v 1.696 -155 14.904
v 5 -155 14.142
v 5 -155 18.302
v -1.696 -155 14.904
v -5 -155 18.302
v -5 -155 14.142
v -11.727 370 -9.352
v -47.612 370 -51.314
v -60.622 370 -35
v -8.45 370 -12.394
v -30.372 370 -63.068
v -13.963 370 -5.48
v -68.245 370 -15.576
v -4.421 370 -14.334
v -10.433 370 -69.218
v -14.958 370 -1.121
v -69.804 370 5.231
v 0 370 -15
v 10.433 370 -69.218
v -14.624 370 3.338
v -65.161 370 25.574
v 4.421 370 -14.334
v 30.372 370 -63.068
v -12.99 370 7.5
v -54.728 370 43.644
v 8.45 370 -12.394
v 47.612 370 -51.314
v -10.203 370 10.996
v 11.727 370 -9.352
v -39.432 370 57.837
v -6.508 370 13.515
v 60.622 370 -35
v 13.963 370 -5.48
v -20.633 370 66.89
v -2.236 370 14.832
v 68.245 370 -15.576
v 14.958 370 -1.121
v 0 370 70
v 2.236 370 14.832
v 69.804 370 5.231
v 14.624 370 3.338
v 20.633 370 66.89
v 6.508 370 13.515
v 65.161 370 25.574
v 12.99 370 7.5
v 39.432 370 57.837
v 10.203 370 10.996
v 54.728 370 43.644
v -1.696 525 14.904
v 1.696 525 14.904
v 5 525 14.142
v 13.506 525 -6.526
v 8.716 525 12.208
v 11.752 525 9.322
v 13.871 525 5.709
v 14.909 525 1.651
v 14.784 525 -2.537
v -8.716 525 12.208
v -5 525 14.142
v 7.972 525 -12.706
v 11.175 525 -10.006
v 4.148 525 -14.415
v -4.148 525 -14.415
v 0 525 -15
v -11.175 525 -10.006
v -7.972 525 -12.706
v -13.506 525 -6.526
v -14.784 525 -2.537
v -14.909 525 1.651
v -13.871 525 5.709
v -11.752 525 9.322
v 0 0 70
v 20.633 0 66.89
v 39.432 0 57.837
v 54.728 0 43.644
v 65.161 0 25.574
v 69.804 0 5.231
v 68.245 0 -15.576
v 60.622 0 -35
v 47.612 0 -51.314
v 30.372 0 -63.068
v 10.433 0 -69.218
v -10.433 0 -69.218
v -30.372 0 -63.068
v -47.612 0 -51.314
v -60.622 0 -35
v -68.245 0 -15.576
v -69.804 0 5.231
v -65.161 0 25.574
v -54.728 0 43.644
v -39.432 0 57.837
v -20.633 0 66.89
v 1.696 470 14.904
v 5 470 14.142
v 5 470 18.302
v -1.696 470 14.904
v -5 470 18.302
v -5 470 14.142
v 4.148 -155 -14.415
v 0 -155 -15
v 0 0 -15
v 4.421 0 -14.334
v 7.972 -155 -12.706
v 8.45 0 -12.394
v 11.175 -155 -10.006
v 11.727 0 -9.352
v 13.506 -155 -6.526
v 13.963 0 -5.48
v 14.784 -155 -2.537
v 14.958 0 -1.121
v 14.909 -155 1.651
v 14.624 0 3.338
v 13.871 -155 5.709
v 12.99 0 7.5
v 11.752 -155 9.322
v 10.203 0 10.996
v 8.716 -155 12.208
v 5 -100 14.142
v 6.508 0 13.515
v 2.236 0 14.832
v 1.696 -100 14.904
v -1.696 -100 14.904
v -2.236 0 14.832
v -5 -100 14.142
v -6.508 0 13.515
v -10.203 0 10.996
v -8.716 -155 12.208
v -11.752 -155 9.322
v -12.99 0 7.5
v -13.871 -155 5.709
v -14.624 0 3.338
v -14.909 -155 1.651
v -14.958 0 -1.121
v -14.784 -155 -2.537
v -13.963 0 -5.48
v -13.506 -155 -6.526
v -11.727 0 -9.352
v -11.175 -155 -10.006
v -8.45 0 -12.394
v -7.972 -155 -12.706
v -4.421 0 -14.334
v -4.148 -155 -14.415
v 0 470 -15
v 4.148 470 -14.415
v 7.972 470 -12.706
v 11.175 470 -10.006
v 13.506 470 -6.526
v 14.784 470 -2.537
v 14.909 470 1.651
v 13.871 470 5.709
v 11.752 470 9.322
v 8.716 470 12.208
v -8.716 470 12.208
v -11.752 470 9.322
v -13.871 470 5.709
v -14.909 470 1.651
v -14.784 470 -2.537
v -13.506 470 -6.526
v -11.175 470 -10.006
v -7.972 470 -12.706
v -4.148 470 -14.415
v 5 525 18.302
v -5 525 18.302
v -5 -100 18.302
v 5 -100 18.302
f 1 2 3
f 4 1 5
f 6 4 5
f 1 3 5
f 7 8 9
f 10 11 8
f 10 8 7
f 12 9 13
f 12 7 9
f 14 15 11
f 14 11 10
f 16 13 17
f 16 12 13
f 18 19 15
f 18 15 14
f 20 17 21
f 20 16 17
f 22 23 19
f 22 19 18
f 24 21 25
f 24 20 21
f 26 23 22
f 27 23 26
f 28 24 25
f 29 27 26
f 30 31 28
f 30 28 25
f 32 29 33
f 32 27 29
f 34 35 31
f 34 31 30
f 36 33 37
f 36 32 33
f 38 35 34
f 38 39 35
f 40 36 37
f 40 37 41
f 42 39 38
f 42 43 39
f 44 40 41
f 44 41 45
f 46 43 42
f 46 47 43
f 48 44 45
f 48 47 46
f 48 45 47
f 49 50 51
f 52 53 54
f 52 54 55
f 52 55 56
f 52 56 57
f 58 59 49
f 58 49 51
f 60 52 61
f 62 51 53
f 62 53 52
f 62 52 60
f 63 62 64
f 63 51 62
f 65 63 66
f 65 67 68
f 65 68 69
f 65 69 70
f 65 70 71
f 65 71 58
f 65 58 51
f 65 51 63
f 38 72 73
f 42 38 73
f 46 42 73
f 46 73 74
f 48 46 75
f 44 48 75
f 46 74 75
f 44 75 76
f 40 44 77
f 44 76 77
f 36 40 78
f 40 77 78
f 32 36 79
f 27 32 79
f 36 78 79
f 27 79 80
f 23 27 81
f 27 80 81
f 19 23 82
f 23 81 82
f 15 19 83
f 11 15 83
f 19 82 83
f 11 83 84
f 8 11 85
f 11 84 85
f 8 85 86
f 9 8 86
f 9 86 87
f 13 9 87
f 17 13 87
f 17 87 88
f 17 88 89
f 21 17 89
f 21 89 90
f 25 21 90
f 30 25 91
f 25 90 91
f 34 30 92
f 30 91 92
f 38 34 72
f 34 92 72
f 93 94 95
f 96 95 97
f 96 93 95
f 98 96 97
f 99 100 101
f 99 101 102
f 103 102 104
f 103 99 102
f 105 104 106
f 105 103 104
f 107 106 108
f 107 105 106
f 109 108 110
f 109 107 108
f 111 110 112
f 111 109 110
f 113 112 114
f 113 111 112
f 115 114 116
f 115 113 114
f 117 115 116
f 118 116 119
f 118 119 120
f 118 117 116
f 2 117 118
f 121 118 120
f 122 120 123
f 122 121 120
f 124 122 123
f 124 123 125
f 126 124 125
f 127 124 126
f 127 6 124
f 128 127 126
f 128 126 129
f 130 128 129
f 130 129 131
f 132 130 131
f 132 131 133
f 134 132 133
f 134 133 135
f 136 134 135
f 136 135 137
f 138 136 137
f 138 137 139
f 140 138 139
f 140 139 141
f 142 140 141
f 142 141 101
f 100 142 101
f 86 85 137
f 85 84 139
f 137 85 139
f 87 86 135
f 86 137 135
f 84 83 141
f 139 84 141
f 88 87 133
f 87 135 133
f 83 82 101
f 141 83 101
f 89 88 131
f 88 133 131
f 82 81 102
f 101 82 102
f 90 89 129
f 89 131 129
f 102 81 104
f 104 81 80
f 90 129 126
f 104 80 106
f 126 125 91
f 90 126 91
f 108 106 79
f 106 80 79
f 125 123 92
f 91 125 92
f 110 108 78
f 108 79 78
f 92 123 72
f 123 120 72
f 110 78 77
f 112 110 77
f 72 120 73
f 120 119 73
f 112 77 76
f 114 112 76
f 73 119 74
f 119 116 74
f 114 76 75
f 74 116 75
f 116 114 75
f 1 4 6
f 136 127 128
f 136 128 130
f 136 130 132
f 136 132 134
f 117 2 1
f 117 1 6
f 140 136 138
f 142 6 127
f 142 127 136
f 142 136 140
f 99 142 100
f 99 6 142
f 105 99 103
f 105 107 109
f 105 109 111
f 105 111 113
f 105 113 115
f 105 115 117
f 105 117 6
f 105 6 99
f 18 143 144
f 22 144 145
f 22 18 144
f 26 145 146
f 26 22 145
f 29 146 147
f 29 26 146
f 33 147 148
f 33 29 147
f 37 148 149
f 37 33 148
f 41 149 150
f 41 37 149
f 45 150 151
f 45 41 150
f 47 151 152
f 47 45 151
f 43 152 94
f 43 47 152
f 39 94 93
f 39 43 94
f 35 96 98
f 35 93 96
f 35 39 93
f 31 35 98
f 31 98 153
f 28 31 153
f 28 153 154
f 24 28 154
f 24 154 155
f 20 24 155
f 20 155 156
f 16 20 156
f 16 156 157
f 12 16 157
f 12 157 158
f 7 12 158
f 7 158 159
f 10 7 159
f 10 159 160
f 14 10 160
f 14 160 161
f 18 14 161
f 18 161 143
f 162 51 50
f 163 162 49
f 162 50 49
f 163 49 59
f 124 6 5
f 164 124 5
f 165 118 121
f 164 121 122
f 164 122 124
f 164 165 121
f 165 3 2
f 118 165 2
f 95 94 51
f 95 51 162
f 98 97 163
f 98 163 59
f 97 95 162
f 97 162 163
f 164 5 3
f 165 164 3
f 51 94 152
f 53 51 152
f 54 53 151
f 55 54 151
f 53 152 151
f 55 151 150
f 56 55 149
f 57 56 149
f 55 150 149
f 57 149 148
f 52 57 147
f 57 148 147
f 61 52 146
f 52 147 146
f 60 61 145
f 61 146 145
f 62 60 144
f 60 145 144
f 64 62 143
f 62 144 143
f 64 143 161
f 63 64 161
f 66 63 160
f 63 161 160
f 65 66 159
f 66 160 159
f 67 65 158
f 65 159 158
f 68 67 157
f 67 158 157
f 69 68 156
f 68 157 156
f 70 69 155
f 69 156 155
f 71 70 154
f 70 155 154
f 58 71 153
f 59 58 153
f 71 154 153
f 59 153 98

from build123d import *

# Parameters (mm, degrees)
SKETCH1_R            = 70
BOSS_EXTRUDE1_DEPTH  = 370
SKETCH2_R            = 10
BOSS_EXTRUDE2_DEPTH  = 100
BOSS_EXTRUDE3_START  = 100
SKETCH3_R            = 10
BOSS_EXTRUDE3_DEPTH  = 100
BOSS_EXTRUDE4_START  = -25
BOSS_EXTRUDE4_DEPTH  = 25
BOSS_EXTRUDE5_DEPTH  = 25
SKETCH6_R            = 15
BOSS_EXTRUDE6_DEPTH  = 570
BOSS_EXTRUDE7_START  = 55
SKETCH7_R            = 15
BOSS_EXTRUDE7_DEPTH  = 55
SKETCH8_R            = 15
BOSS_EXTRUDE8_DEPTH  = 55
BOSS_EXTRUDE9_DEPTH  = 55
BOSS_EXTRUDE10_START = -55
BOSS_EXTRUDE10_DEPTH = 55


with BuildPart() as part:
    # Sketch1 → Boss-Extrude1 (new body)
    with BuildSketch(Plane(origin=(0, 0, 0), x_dir=(1, 0, 0), z_dir=(0, 1, 0))):
        with Locations(Location((0, 0, 0), (0, 0, 270))):
            Circle(SKETCH1_R)
    extrude(amount=BOSS_EXTRUDE1_DEPTH)

    # Sketch2 → Boss-Extrude2 (add)
    with BuildSketch(Plane(origin=(0, 370, 0), x_dir=(1, 0, 0), z_dir=(0, 1, 0))):
        with Locations(Location((0, 0, 0), (0, 0, 270))):
            Circle(SKETCH2_R)
    extrude(amount=BOSS_EXTRUDE2_DEPTH)

    # Sketch3 → Boss-Extrude3 (add)
    with BuildSketch(Plane.XZ.offset(BOSS_EXTRUDE3_START)):
        with Locations(Location((0, 0, 0), (0, 0, 90))):
            Circle(SKETCH3_R)
    extrude(amount=-BOSS_EXTRUDE3_DEPTH)

    # Sketch4 → Boss-Extrude4 (add)
    with BuildSketch(Plane(origin=(0, 470, 0), x_dir=(1, 0, 0), z_dir=(0, 1, 0)).offset(BOSS_EXTRUDE4_START)):
        with BuildLine():
            Line((-5, 8.660254038), (-5, 12.820254038))
            Line((-5, 12.820254038), (5, 12.820254038))
            Line((5, 12.820254038), (5, 8.660254038))
            ThreePointArc((5, 8.660254038), (0, 10), (-5, 8.660254038))
        make_face()
    extrude(amount=BOSS_EXTRUDE4_DEPTH)

    # Sketch5 → Boss-Extrude5 (add)
    with BuildSketch(Plane.XZ.offset(100)):
        with BuildLine():
            Line((-5, 8.660254038), (-5, 12.820254038))
            Line((-5, 12.820254038), (5, 12.820254038))
            Line((5, 12.820254038), (5, 8.660254038))
            ThreePointArc((5, 8.660254038), (0, 10), (-5, 8.660254038))
        make_face()
    extrude(amount=-BOSS_EXTRUDE5_DEPTH)

    # Sketch6 → Boss-Extrude6 (add)
    with BuildSketch(Plane.XZ.offset(100)):
        with Locations(Location((0, 0, 0), (0, 0, 270))):
            Circle(SKETCH6_R)
    extrude(amount=-BOSS_EXTRUDE6_DEPTH)

    # Sketch7 → Boss-Extrude7 (add)
    with BuildSketch(Plane.XZ.offset(100).offset(BOSS_EXTRUDE7_START)):
        with Locations(Location((0, 0, 0), (0, 0, 270))):
            Circle(SKETCH7_R)
    extrude(amount=-BOSS_EXTRUDE7_DEPTH)

    # Sketch8 → Boss-Extrude8 (add)
    with BuildSketch(Plane(origin=(0, 470, 0), x_dir=(1, 0, 0), z_dir=(0, 1, 0))):
        with Locations(Location((0, 0, 0), (0, 0, 90))):
            Circle(SKETCH8_R)
    extrude(amount=BOSS_EXTRUDE8_DEPTH)

    # Sketch9 → Boss-Extrude9 (add)
    with BuildSketch(Plane.XZ.offset(155)):
        with BuildLine():
            Line((-5, 14.142135624), (-5, 18.302135624))
            Line((-5, 18.302135624), (5, 18.302135624))
            Line((5, 18.302135624), (5, 14.142135624))
            ThreePointArc((5, 14.142135624), (0, 15), (-5, 14.142135624))
        make_face()
    extrude(amount=-BOSS_EXTRUDE9_DEPTH)

    # Sketch10 → Boss-Extrude10 (add)
    with BuildSketch(Plane(origin=(0, 525, 0), x_dir=(1, 0, 0), z_dir=(0, 1, 0)).offset(BOSS_EXTRUDE10_START)):
        with BuildLine():
            Line((5, -14.142135624), (5, -18.302135624))
            Line((5, -18.302135624), (-5, -18.302135624))
            Line((-5, -18.302135624), (-5, -14.142135624))
            ThreePointArc((-5, -14.142135624), (0, -15), (5, -14.142135624))
        make_face()
    extrude(amount=BOSS_EXTRUDE10_DEPTH)


solid = part.part
